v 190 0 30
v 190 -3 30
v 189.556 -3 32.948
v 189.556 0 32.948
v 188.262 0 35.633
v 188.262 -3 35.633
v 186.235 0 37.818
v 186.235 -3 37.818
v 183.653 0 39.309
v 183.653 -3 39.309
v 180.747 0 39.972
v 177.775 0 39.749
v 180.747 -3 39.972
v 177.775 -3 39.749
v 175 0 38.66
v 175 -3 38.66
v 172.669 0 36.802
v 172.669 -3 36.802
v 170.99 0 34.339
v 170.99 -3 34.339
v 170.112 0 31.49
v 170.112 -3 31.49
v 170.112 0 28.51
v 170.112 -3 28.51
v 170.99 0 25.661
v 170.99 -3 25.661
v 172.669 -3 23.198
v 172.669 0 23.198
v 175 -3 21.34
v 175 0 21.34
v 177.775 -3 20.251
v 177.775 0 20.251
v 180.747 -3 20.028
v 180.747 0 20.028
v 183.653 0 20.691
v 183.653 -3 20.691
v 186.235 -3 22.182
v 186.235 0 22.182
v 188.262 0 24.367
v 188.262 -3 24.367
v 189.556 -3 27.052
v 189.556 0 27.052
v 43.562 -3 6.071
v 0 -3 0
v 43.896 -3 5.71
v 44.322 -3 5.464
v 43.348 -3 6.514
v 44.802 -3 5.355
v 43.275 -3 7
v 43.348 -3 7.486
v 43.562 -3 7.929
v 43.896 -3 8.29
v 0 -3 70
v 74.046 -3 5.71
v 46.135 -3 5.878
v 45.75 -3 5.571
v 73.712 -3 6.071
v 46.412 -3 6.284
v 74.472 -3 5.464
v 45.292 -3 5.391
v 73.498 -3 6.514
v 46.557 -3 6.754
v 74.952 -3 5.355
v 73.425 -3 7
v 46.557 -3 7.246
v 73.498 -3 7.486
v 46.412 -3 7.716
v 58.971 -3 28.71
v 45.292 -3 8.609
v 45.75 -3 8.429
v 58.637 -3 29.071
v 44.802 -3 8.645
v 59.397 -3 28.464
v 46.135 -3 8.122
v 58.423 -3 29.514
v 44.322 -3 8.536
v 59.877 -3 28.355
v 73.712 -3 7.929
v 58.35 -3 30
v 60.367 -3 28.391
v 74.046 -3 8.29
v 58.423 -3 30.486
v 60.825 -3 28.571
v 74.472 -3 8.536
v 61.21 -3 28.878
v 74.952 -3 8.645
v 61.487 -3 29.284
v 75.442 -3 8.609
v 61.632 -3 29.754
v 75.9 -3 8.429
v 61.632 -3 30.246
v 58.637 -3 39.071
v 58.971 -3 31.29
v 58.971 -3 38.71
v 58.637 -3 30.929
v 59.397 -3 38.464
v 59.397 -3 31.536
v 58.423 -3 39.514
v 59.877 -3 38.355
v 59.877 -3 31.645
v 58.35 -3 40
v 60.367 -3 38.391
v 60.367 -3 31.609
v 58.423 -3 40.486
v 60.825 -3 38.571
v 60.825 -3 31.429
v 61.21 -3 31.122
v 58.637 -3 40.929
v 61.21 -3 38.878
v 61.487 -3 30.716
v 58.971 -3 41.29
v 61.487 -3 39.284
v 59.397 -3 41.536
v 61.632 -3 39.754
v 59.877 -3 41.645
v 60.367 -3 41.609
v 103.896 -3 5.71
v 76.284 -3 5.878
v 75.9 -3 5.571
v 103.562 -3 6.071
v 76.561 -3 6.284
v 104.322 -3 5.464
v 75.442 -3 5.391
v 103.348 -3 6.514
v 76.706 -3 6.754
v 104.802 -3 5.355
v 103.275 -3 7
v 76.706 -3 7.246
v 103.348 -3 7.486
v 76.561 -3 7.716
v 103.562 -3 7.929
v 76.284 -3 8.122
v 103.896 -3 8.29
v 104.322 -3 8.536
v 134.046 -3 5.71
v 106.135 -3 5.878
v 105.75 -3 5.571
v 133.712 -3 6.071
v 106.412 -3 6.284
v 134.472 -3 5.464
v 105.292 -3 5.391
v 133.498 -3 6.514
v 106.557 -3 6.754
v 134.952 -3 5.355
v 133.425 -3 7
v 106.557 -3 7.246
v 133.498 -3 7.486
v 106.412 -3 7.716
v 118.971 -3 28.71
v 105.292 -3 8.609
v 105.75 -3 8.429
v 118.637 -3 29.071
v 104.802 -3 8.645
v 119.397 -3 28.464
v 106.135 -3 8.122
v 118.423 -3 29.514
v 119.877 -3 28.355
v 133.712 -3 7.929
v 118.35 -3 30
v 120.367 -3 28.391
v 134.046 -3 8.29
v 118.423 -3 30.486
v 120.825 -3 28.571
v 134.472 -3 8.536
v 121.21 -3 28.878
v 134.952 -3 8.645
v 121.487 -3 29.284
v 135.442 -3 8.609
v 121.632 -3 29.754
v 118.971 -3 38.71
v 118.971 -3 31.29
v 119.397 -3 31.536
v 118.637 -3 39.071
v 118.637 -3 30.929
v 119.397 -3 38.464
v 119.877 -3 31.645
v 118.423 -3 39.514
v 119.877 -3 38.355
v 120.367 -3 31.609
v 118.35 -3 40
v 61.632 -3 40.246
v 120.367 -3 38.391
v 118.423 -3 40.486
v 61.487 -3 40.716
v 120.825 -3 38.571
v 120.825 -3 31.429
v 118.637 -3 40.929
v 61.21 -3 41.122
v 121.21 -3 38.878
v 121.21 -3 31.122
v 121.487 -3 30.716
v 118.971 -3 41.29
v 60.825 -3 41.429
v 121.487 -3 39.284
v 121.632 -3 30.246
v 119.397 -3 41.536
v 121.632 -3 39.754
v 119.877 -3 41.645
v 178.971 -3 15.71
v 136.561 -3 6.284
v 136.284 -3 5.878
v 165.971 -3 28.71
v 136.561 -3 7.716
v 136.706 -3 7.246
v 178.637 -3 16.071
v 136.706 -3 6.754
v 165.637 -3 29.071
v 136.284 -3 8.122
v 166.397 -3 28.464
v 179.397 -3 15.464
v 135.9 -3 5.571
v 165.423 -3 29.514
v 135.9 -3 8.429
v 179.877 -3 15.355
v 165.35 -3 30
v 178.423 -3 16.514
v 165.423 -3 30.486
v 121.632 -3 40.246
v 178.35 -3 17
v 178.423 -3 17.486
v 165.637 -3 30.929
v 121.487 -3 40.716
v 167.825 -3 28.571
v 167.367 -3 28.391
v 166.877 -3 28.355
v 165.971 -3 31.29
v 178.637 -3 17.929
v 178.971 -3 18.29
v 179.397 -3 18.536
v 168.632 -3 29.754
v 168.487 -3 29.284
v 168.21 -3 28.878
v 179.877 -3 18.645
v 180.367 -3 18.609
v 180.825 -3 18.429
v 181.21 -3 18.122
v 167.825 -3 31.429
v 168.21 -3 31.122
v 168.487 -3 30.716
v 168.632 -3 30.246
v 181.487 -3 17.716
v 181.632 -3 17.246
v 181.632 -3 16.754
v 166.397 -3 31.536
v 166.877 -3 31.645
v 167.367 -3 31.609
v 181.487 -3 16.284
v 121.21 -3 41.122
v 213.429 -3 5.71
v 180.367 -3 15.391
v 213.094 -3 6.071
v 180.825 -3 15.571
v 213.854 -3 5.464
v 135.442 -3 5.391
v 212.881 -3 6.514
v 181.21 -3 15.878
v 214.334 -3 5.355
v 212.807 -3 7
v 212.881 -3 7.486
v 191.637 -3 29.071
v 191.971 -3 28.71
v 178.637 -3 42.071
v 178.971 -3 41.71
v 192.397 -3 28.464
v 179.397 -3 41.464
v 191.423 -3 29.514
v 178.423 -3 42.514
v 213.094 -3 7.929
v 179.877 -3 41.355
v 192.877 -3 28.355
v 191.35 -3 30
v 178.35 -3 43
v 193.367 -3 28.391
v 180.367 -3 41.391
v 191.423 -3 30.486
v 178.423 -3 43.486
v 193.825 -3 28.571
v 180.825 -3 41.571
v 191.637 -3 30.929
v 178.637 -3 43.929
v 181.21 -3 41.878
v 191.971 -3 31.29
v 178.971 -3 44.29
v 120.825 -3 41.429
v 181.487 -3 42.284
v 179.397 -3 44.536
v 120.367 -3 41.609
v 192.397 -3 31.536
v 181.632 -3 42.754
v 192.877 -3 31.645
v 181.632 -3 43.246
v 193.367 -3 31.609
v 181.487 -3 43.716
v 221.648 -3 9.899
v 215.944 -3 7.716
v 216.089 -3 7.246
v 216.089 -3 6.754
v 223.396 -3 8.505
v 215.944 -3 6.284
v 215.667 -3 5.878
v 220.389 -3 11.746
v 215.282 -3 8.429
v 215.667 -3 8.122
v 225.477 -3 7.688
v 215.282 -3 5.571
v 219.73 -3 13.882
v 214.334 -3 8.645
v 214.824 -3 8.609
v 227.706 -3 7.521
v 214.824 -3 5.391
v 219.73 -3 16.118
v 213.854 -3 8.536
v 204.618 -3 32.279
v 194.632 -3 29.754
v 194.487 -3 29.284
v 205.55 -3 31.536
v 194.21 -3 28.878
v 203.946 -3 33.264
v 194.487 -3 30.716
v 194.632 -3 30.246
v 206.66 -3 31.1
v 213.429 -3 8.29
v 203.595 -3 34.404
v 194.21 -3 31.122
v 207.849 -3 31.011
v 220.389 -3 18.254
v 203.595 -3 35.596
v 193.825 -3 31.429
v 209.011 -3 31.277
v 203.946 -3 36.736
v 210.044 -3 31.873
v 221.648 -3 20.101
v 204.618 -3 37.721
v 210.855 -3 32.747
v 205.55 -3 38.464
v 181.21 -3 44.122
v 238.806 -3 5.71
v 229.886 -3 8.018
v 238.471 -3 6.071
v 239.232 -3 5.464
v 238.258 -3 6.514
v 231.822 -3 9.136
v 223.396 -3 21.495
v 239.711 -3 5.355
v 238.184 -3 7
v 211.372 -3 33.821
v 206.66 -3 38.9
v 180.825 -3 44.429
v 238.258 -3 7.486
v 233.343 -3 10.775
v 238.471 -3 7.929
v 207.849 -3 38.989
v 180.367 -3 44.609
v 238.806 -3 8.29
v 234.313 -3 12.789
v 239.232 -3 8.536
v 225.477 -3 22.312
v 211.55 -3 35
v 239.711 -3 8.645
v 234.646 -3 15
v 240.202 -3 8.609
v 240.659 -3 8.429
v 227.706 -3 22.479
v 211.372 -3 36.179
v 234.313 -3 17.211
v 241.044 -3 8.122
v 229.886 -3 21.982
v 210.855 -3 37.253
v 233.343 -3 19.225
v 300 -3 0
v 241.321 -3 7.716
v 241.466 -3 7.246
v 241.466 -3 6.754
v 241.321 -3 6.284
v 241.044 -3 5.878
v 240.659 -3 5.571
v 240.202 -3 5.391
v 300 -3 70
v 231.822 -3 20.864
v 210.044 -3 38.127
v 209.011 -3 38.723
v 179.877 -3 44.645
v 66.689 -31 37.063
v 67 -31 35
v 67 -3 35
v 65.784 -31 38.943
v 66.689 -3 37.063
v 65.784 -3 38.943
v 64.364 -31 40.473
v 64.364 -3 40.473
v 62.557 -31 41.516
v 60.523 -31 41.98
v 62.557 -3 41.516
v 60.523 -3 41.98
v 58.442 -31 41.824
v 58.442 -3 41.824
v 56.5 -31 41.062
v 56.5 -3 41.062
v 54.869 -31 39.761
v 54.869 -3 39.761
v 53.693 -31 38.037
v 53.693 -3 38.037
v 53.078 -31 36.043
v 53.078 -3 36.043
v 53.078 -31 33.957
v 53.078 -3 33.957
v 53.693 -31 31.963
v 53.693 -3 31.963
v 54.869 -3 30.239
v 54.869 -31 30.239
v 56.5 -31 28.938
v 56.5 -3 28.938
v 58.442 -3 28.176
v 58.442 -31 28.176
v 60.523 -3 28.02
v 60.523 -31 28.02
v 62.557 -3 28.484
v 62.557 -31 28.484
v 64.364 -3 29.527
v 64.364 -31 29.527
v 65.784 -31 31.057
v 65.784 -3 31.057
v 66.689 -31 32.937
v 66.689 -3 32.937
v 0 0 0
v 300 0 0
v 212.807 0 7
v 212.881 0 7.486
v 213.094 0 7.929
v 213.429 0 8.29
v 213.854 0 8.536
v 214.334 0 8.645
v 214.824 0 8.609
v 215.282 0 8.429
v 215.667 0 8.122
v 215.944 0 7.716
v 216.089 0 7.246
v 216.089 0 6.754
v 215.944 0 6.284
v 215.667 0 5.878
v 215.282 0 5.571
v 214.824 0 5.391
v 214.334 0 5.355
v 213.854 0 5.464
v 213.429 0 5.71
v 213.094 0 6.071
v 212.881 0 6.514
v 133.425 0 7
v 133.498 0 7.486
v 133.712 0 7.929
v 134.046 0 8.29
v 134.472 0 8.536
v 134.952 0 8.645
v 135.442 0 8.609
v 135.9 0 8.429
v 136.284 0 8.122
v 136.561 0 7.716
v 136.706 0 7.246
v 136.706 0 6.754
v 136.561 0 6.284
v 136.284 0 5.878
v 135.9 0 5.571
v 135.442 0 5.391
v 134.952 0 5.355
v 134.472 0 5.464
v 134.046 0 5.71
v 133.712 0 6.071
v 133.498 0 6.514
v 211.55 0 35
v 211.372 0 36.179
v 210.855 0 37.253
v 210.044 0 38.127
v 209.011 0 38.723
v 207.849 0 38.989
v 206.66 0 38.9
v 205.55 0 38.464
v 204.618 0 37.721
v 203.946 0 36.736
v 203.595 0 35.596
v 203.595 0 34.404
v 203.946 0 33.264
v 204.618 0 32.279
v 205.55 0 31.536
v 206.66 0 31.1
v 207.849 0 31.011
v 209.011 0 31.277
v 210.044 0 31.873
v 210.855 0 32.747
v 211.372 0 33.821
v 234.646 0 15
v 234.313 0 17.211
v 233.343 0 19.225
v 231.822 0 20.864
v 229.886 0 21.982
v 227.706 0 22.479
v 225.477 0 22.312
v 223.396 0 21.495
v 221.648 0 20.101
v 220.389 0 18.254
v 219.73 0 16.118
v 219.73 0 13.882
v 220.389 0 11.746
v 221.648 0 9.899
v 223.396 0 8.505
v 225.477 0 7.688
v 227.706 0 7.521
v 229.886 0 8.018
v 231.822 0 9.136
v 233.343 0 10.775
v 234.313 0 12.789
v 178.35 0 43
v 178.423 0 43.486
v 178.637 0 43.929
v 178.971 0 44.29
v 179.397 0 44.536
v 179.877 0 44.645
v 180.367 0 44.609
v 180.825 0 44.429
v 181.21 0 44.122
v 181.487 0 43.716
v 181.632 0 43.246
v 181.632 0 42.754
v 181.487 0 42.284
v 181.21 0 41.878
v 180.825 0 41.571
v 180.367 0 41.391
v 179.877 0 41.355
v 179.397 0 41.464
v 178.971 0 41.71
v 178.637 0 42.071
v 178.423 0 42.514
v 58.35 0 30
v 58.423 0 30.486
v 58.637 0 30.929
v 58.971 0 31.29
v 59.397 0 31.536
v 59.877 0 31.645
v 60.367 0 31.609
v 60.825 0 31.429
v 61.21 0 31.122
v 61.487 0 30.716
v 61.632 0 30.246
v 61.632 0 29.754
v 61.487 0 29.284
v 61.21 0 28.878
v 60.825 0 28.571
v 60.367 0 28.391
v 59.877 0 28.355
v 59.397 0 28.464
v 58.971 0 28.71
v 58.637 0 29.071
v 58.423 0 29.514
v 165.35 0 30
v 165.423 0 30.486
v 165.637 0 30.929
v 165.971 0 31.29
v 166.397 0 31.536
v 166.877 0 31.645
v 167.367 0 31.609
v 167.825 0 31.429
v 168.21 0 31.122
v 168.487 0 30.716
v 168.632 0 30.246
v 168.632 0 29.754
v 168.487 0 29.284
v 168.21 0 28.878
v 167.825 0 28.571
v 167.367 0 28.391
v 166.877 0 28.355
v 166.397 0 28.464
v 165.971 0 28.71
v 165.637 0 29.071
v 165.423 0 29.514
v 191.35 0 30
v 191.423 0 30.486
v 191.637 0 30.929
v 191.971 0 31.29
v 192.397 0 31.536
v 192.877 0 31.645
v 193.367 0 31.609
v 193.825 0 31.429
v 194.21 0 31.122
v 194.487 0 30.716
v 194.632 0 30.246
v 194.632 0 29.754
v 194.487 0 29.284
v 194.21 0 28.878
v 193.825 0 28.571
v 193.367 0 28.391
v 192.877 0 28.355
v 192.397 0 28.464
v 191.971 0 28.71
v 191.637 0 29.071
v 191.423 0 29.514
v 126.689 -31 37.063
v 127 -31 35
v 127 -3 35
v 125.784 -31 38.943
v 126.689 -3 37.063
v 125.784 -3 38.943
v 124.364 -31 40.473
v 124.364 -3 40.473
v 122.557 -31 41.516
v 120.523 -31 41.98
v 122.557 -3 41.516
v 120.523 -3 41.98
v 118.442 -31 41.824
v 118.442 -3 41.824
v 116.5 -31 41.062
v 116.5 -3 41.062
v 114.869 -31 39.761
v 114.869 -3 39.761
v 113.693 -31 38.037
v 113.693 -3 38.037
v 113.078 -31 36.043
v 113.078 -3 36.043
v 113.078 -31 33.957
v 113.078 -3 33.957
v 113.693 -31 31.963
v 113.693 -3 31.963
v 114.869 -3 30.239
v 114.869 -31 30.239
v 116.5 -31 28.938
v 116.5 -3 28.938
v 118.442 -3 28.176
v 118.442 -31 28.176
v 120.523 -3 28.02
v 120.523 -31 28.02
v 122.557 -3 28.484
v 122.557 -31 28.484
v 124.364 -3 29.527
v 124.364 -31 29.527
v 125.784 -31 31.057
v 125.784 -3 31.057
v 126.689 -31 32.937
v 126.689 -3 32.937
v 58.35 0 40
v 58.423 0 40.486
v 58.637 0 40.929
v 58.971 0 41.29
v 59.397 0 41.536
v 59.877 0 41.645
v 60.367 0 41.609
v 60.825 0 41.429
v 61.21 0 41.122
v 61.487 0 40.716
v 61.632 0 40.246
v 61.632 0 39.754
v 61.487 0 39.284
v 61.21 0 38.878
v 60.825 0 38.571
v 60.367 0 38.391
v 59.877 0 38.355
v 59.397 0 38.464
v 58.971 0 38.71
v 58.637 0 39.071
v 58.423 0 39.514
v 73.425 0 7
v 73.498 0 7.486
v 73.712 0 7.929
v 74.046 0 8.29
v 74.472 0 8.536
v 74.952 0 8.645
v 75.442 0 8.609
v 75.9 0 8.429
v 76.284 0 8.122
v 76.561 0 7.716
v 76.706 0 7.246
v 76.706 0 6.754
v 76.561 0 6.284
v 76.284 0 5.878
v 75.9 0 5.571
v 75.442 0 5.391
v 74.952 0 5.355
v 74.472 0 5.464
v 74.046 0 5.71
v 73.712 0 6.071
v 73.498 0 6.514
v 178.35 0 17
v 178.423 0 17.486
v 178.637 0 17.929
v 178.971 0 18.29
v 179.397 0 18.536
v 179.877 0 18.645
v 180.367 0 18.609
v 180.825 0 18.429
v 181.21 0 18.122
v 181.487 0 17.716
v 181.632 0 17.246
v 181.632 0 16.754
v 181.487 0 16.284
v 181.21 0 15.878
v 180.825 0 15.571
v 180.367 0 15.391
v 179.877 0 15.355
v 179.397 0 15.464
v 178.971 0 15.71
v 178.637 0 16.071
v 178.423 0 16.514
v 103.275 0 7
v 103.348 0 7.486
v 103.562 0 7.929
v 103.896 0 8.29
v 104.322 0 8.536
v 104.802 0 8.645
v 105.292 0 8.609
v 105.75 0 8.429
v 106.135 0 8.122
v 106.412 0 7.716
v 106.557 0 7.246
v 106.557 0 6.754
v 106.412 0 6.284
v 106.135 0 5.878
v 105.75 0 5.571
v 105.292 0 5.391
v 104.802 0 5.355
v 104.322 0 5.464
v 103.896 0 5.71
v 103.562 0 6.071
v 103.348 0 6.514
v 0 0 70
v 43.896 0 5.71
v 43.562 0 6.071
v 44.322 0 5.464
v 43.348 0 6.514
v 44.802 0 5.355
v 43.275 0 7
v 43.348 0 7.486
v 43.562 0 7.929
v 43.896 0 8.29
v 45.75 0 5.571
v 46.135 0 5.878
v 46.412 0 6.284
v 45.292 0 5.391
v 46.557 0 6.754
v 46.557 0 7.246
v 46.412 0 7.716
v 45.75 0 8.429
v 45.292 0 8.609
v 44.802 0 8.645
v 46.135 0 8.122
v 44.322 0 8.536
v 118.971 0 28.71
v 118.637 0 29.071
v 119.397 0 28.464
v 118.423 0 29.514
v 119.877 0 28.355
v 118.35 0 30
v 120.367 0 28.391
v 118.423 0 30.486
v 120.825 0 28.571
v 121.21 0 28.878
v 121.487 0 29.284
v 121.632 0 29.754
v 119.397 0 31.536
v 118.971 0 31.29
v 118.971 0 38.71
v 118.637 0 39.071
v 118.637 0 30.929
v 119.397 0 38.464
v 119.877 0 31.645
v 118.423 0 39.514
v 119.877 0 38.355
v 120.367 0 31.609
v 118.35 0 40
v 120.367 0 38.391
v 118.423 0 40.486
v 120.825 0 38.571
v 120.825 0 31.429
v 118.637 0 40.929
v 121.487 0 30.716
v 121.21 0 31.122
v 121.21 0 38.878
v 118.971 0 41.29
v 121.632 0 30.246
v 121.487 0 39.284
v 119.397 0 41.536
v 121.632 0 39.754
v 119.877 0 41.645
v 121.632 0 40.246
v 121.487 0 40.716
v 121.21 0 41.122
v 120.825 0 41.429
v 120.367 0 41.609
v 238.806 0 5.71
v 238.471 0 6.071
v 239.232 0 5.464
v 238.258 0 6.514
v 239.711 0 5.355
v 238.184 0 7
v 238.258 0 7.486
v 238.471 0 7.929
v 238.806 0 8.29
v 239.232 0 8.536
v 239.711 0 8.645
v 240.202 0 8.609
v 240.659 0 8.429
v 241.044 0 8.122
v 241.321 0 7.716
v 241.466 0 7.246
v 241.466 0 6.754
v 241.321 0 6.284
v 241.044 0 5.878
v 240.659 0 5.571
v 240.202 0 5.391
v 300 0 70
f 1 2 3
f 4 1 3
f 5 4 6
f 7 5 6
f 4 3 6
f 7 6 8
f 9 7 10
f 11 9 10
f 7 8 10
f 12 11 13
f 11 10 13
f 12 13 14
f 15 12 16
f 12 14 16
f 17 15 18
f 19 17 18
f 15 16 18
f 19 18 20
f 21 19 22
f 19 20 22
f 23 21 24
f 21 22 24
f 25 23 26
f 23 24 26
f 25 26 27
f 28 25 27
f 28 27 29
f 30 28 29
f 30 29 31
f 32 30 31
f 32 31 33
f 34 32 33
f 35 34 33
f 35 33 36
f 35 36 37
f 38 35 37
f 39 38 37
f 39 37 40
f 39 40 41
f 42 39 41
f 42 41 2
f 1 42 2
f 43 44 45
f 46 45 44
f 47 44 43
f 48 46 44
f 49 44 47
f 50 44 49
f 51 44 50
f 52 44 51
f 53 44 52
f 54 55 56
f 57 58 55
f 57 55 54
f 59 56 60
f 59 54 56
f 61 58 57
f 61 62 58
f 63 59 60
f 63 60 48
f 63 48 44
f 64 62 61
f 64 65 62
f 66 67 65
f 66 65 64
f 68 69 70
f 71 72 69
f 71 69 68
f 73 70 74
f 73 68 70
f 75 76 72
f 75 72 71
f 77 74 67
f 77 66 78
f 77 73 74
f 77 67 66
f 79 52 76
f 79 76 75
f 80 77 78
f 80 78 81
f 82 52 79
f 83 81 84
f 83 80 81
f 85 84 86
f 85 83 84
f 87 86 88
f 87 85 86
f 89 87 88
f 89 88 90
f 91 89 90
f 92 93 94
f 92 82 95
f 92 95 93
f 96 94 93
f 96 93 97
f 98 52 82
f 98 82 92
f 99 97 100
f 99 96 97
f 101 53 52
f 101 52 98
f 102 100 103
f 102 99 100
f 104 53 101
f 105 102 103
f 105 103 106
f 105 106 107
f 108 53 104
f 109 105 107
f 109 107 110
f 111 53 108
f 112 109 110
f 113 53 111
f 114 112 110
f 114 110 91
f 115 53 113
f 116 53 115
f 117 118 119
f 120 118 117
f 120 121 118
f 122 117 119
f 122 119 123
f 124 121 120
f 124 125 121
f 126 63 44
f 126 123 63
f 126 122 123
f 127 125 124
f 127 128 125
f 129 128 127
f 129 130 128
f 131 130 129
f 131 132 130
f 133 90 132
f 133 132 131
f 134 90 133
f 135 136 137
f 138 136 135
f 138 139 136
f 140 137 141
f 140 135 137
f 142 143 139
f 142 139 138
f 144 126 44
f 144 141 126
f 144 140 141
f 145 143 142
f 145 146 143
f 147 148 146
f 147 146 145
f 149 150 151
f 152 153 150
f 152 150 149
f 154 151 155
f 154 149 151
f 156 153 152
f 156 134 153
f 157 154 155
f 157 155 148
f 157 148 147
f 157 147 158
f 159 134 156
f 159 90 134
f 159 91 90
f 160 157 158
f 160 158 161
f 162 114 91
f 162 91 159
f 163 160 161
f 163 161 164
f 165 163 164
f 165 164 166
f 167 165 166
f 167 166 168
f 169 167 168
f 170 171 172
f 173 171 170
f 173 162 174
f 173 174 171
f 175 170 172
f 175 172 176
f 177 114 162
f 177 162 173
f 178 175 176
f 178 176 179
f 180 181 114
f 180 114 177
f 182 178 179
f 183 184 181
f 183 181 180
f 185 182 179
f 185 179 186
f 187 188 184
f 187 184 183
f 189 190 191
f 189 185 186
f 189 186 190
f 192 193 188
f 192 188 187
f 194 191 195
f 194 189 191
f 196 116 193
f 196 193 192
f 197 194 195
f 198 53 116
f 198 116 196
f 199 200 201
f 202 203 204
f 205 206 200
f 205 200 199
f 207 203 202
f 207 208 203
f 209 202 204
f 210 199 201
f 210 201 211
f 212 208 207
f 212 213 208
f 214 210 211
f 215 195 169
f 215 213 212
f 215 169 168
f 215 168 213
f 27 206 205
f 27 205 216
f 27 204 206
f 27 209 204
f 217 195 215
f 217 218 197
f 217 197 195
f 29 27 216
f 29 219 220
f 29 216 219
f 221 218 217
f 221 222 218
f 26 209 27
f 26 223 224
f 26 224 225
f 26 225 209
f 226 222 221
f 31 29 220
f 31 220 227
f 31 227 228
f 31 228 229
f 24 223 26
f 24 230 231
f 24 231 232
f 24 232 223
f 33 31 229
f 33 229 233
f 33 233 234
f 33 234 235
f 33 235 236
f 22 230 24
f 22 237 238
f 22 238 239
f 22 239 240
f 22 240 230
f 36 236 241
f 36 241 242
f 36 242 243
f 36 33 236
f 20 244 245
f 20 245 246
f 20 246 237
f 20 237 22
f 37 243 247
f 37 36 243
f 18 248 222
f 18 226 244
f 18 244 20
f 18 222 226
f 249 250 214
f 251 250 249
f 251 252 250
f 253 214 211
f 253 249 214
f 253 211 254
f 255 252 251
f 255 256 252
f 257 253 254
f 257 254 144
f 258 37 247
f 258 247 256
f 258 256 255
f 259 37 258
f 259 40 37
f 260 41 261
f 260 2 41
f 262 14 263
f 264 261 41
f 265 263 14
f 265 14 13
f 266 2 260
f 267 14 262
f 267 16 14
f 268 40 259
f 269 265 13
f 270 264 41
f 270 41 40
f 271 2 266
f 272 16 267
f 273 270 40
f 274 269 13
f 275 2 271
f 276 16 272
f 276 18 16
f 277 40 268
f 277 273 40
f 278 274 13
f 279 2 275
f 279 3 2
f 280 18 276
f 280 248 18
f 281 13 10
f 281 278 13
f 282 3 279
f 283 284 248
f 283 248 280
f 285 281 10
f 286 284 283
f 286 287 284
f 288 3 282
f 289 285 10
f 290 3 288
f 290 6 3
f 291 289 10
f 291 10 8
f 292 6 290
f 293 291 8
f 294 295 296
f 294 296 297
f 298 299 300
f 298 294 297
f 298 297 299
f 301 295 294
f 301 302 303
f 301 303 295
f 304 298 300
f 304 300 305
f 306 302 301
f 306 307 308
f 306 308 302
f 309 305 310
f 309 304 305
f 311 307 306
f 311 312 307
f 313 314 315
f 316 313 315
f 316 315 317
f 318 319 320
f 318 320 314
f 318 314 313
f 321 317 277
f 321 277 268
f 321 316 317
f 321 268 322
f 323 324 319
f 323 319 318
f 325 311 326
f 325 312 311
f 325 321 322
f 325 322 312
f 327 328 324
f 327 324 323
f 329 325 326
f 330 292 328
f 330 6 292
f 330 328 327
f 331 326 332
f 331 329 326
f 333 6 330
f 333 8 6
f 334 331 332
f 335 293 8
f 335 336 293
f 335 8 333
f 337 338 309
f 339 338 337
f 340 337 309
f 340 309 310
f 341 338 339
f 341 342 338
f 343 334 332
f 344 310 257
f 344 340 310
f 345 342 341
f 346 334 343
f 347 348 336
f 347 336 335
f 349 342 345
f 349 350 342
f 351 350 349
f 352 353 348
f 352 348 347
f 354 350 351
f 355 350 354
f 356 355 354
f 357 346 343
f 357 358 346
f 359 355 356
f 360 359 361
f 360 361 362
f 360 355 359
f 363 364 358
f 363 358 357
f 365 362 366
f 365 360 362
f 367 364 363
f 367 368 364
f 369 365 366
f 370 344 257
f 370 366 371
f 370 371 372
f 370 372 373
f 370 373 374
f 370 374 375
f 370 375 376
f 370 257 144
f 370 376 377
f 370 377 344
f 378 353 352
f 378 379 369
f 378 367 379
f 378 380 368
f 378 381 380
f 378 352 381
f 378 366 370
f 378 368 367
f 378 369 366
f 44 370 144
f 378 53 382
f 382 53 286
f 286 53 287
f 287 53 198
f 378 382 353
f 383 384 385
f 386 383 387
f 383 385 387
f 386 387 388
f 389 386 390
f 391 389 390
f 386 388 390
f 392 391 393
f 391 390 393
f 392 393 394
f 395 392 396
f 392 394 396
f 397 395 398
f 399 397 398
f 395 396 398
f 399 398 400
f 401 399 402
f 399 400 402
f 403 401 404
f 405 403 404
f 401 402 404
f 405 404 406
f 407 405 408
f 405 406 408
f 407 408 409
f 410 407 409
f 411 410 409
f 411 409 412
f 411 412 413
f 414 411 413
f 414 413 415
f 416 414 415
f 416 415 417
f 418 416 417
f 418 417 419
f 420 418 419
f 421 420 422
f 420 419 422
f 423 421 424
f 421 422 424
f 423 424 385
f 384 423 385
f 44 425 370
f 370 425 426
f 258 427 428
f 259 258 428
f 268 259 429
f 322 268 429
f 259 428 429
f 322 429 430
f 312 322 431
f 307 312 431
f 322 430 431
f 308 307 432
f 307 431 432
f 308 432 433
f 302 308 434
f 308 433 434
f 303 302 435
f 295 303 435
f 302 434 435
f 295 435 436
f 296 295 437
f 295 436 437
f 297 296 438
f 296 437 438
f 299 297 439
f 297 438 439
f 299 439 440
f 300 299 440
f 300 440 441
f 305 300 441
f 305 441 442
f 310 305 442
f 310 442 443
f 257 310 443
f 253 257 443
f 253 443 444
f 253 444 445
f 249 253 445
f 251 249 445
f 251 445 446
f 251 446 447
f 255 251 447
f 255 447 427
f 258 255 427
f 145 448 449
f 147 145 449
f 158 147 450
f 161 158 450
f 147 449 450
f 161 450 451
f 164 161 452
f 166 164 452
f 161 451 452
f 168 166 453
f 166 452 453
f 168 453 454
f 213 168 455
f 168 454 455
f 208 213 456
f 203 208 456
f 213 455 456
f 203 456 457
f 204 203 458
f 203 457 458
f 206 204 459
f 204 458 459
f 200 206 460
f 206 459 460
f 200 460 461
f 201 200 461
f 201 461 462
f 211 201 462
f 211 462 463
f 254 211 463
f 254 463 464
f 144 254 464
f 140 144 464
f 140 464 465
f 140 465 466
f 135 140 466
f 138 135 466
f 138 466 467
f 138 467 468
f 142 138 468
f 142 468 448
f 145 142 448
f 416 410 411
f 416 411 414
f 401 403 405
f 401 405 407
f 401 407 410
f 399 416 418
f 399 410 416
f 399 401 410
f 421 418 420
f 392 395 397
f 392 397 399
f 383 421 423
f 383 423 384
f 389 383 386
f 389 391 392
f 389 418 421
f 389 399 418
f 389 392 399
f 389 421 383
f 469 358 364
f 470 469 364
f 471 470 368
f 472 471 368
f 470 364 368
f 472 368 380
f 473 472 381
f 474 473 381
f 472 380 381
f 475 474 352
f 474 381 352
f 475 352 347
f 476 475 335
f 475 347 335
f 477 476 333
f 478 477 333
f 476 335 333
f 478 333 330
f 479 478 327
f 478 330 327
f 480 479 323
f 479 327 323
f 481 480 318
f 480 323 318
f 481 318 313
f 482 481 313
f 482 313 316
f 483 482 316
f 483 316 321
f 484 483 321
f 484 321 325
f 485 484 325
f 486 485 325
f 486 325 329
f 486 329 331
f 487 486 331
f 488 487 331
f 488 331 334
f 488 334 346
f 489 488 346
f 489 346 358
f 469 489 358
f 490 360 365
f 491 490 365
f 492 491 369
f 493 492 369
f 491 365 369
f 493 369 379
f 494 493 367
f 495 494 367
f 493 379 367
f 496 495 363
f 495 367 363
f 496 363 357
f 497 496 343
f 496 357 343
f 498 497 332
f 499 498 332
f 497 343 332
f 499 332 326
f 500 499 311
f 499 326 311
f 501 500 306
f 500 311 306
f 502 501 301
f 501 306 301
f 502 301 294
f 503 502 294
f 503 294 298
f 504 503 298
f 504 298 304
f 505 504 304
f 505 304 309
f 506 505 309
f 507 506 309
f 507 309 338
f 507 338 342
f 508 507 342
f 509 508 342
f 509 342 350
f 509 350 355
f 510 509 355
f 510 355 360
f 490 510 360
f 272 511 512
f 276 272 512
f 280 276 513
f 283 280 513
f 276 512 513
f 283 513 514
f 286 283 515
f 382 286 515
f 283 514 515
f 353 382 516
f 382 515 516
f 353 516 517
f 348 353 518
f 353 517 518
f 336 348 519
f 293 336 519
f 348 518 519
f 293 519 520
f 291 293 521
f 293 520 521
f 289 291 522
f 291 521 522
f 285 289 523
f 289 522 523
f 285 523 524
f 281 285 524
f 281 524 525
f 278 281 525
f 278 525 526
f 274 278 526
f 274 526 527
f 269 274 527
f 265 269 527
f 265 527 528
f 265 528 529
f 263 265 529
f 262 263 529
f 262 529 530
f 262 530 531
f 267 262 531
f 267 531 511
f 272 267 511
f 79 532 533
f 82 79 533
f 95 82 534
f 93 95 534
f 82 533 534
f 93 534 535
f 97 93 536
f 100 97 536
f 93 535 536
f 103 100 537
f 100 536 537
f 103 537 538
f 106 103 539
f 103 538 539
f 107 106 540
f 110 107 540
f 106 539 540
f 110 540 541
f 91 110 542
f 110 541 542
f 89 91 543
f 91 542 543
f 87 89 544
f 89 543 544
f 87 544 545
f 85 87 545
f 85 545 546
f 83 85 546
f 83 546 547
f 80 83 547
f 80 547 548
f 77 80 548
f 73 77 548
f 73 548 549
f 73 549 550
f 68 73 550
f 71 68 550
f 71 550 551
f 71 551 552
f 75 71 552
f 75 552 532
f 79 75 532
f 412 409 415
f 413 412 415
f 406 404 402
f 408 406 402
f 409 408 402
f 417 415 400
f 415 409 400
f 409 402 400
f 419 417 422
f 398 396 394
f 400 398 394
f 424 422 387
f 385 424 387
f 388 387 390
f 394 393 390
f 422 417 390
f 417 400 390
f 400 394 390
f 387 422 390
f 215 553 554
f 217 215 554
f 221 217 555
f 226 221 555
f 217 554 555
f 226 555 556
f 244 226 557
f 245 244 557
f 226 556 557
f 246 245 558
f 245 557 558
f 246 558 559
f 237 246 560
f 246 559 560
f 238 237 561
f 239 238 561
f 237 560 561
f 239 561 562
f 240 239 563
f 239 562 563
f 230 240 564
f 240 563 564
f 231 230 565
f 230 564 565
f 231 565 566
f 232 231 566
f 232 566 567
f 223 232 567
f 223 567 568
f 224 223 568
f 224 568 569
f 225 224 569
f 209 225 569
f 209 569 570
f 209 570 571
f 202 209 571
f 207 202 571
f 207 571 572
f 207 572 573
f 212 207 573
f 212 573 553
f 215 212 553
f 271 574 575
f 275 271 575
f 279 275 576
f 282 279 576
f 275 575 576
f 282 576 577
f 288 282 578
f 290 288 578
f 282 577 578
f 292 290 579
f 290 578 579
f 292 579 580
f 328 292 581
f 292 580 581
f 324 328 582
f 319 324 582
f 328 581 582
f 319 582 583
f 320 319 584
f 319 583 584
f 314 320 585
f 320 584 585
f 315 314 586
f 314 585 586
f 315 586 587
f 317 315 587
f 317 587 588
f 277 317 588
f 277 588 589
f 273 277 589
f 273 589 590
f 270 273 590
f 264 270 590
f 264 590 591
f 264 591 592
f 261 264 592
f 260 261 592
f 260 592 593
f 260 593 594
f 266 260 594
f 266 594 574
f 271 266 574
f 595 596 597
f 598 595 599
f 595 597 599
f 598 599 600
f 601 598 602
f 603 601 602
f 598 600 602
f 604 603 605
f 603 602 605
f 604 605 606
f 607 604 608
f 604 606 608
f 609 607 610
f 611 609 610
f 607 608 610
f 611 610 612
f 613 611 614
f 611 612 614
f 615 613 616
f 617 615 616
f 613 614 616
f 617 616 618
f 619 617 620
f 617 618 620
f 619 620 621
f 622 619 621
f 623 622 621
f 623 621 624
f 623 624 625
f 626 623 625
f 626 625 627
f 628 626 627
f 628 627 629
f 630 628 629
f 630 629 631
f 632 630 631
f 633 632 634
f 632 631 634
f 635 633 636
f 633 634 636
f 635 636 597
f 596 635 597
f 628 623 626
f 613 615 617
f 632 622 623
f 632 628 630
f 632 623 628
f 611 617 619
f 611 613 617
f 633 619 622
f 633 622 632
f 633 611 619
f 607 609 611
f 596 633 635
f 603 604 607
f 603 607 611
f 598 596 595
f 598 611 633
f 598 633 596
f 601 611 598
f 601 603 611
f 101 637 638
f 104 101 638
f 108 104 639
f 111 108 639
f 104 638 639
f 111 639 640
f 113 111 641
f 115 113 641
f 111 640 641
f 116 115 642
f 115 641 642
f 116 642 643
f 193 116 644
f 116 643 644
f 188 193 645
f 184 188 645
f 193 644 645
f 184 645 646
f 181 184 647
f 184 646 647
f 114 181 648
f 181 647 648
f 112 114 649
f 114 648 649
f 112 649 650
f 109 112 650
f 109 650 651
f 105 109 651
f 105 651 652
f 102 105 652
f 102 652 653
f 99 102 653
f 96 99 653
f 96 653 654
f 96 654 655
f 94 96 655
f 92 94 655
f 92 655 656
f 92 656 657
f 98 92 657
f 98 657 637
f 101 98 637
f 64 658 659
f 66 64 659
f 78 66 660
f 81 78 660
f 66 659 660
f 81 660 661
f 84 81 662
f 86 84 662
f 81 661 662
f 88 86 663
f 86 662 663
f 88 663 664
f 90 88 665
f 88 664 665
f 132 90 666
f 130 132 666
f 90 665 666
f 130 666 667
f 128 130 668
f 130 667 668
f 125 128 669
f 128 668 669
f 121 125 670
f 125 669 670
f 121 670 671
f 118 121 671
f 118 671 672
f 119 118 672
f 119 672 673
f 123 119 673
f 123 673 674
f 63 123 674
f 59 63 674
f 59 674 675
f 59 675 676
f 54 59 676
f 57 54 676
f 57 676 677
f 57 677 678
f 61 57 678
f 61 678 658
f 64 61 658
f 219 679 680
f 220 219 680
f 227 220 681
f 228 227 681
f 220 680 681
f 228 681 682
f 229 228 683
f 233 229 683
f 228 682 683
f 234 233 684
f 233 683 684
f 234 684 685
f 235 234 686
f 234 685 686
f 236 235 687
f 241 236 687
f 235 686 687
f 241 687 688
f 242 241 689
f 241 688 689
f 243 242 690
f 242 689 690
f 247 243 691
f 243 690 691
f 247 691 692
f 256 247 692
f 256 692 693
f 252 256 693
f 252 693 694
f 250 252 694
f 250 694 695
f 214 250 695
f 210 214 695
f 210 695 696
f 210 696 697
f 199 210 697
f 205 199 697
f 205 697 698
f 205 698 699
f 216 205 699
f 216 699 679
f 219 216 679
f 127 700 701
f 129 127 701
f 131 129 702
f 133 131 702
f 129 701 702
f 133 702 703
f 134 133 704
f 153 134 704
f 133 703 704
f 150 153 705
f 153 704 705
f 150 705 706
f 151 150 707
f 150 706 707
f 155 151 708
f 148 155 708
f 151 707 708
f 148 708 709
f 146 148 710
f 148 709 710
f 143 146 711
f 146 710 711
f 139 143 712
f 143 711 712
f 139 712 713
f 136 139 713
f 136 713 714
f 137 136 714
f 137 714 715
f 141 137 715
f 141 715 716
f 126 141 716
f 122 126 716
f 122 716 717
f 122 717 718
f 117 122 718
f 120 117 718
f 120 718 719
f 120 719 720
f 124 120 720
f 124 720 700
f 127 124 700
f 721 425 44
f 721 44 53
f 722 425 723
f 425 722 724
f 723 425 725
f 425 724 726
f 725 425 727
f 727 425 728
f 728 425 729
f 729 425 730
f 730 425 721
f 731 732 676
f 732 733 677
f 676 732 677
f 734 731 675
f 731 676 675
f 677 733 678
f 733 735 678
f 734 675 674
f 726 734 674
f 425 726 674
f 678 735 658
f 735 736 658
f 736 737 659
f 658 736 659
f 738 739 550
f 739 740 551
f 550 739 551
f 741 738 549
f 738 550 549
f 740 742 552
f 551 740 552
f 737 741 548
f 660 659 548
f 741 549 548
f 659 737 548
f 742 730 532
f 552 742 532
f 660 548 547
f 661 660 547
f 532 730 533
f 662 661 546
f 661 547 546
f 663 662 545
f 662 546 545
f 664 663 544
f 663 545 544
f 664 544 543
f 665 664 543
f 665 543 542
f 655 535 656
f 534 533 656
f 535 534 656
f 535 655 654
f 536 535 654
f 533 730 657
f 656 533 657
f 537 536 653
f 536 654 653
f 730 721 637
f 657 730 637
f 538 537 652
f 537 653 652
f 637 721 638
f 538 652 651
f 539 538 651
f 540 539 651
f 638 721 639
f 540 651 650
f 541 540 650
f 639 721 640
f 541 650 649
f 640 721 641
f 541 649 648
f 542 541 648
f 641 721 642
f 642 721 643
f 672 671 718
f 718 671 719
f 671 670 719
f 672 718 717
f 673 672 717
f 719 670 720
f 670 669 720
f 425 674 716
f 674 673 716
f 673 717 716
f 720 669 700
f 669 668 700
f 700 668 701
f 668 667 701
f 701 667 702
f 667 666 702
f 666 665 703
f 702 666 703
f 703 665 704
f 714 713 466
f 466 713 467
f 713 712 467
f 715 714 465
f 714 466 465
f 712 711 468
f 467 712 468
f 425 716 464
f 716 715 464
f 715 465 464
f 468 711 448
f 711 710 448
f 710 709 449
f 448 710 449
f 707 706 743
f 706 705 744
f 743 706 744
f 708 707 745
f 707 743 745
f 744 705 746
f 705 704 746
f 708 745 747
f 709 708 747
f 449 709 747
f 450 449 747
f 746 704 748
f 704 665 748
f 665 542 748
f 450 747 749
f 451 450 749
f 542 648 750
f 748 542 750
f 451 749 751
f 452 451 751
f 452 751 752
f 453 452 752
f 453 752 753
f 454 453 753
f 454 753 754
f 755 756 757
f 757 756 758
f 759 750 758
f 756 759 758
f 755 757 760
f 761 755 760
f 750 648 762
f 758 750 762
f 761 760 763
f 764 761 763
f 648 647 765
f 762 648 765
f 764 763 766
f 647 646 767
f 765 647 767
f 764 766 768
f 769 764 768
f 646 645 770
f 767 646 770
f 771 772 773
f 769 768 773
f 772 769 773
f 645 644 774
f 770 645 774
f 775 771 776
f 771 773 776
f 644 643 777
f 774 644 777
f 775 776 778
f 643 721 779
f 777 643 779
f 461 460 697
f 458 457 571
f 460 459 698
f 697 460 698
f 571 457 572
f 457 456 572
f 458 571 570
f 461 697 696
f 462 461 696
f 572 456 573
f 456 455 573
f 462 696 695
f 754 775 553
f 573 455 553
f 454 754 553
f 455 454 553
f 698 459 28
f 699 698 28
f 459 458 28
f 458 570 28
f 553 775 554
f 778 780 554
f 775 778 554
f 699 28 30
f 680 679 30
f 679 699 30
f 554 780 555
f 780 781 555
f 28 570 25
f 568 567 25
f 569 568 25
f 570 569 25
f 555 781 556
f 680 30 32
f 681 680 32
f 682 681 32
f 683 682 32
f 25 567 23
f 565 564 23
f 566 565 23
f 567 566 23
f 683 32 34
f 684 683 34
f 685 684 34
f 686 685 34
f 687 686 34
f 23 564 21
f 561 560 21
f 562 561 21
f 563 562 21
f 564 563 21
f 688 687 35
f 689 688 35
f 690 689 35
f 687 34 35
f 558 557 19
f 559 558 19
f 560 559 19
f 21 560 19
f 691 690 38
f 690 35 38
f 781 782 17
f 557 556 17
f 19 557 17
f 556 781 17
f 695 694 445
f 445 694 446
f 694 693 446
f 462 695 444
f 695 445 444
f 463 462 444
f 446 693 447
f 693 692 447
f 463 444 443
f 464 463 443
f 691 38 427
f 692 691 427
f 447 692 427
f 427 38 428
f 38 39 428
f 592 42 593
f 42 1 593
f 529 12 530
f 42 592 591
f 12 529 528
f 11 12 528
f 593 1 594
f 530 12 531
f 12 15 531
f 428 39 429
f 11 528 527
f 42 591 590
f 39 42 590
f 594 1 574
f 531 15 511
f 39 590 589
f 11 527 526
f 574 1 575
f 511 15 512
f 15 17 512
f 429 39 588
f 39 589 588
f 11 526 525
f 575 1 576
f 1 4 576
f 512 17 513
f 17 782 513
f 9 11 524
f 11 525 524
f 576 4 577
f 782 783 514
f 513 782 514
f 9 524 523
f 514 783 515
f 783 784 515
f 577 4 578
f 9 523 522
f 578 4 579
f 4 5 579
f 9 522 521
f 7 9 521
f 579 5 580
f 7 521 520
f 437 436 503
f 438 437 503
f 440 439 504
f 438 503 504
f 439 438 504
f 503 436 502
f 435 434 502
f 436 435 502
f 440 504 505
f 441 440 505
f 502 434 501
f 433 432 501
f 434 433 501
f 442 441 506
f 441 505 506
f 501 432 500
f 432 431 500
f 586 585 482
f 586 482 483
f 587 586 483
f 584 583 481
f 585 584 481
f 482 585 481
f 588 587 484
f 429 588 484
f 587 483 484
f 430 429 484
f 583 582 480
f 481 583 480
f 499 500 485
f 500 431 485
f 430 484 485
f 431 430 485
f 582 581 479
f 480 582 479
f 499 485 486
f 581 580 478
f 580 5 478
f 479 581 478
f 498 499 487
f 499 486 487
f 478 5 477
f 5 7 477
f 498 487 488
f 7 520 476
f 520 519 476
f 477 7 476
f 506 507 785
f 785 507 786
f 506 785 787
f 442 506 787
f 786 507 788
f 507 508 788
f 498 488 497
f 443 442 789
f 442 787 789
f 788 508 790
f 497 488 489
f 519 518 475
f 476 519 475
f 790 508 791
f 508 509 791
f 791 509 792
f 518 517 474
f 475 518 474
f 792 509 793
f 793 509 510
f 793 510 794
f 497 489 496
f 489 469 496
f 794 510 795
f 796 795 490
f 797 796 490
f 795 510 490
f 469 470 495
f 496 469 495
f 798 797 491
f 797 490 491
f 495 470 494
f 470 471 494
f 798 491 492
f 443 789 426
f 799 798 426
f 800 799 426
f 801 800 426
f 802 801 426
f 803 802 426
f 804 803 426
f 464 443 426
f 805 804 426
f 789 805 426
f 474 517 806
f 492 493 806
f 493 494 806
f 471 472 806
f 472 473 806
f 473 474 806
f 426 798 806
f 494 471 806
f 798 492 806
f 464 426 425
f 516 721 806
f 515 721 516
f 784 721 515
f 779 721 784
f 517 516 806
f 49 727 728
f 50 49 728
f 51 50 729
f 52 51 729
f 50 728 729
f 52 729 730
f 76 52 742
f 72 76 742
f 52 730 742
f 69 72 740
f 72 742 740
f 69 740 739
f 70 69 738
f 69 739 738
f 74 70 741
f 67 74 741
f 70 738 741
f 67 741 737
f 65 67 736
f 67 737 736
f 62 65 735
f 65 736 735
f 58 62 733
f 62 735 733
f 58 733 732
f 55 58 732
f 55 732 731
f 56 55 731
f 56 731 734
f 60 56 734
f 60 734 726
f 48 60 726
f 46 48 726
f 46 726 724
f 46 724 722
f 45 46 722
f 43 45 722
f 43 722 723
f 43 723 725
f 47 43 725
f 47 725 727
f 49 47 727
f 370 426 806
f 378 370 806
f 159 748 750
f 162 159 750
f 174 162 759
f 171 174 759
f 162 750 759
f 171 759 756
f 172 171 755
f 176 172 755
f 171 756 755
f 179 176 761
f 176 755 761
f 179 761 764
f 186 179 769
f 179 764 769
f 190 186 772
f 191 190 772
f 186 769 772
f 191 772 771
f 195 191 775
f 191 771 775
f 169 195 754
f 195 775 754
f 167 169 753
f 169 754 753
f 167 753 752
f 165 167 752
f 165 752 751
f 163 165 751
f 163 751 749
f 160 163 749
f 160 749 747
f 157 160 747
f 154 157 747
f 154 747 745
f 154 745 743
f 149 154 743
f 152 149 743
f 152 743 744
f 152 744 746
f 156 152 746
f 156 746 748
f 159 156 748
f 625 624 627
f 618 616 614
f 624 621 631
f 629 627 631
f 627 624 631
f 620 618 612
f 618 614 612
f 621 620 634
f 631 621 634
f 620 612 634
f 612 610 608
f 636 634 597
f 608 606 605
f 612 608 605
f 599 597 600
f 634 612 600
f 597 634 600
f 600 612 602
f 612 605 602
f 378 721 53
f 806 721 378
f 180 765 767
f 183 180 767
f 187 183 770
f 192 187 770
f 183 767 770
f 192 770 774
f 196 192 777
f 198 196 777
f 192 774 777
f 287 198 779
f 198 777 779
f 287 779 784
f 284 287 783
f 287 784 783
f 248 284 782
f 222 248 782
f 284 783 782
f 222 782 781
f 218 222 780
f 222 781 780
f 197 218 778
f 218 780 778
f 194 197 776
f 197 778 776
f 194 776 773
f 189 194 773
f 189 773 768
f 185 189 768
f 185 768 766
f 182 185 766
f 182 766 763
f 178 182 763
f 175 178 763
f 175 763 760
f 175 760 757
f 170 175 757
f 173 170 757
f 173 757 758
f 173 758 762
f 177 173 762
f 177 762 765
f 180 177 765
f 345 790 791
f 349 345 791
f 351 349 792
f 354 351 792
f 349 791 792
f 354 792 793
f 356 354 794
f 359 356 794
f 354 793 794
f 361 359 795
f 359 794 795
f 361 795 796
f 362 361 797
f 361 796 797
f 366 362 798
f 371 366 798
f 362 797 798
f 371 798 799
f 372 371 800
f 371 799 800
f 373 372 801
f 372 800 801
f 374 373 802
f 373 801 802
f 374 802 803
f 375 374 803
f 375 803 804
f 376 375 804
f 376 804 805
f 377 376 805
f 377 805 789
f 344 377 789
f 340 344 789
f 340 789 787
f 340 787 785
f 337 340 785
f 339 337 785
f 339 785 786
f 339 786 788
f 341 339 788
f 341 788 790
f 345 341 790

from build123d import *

# Parameters (mm, degrees)
F0_W      = 300
F0_H      = 70
F1_DEPTH  = 3
F3_D      = 3.3
F4_R      = 7
F4_R_2    = 1.65
F5_DEPTH  = 28
F7_D      = 3.3
F8_R      = 10
F9_DEPTH  = 3.001
F10_R     = 4
F10_R_2   = 7.5
F11_DEPTH = 3.001
F13_D     = 3.3


with BuildPart() as f1:
    # F0 (on Front) → F1 (new body)
    with BuildSketch(Plane.XZ):
        with Locations((150, 35)):
            Rectangle(F0_W, F0_H)
    extrude(amount=F1_DEPTH)

    # F3 (through all)
    with Locations(Plane.XZ.offset(3)):
        with Locations((60, 40), (60, 30), (120, 40), (120, 30)):
            Hole(F3_D / 2)

    # F7 (through all)
    with Locations(Plane.XZ.offset(3)):
        with Locations((167, 30), (180, 43), (193, 30), (180, 17)):
            Hole(F7_D / 2)

    # F8 (on face) → F9 (cut, through all)
    with BuildSketch(Plane.XZ.offset(3)):
        with Locations((180, 30)):
            Circle(F8_R)
    extrude(amount=-F9_DEPTH, mode=Mode.SUBTRACT)

    # F10 (on face) → F11 (cut, through all)
    with BuildSketch(Plane.XZ.offset(3)):
        with Locations((207.5499546279, 35)):
            Circle(F10_R)
        with Locations((227.1458725702, 15)):
            Circle(F10_R_2)
    extrude(amount=-F11_DEPTH, mode=Mode.SUBTRACT)

    # F13 (through all)
    with Locations(Plane.XZ.offset(3)):
        with Locations((44.9251865683, 7), (75.0748134317, 7), (104.9251865683, 7), (135.0748134317, 7), (214.4572950297, 7), (239.8344501106, 7)):
            Hole(F13_D / 2)


with BuildPart() as f5:
    # F4 (on face) → F5 (new body)
    with BuildSketch(Plane.XZ.offset(3)):
        with Locations((60, 35)):
            Circle(F4_R)
        with Locations((60, 30)):
            Circle(F4_R_2, mode=Mode.SUBTRACT)
        with Locations((60, 40)):
            Circle(F4_R_2, mode=Mode.SUBTRACT)
        with Locations((60, 40)):
            Circle(F4_R_2)
        with Locations((60, 30)):
            Circle(F4_R_2)
    extrude(amount=F5_DEPTH)


with BuildPart() as f5b:
    # F4 (on face) → F5, piece 2 (new body)
    with BuildSketch(Plane.XZ.offset(3)):
        with Locations((120, 35)):
            Circle(F4_R)
        with Locations((120, 30)):
            Circle(F4_R_2, mode=Mode.SUBTRACT)
        with Locations((120, 40)):
            Circle(F4_R_2, mode=Mode.SUBTRACT)
        with Locations((120, 40)):
            Circle(F4_R_2)
        with Locations((120, 30)):
            Circle(F4_R_2)
    extrude(amount=F5_DEPTH)


solid = Compound([f1.part, f5.part, f5b.part])
